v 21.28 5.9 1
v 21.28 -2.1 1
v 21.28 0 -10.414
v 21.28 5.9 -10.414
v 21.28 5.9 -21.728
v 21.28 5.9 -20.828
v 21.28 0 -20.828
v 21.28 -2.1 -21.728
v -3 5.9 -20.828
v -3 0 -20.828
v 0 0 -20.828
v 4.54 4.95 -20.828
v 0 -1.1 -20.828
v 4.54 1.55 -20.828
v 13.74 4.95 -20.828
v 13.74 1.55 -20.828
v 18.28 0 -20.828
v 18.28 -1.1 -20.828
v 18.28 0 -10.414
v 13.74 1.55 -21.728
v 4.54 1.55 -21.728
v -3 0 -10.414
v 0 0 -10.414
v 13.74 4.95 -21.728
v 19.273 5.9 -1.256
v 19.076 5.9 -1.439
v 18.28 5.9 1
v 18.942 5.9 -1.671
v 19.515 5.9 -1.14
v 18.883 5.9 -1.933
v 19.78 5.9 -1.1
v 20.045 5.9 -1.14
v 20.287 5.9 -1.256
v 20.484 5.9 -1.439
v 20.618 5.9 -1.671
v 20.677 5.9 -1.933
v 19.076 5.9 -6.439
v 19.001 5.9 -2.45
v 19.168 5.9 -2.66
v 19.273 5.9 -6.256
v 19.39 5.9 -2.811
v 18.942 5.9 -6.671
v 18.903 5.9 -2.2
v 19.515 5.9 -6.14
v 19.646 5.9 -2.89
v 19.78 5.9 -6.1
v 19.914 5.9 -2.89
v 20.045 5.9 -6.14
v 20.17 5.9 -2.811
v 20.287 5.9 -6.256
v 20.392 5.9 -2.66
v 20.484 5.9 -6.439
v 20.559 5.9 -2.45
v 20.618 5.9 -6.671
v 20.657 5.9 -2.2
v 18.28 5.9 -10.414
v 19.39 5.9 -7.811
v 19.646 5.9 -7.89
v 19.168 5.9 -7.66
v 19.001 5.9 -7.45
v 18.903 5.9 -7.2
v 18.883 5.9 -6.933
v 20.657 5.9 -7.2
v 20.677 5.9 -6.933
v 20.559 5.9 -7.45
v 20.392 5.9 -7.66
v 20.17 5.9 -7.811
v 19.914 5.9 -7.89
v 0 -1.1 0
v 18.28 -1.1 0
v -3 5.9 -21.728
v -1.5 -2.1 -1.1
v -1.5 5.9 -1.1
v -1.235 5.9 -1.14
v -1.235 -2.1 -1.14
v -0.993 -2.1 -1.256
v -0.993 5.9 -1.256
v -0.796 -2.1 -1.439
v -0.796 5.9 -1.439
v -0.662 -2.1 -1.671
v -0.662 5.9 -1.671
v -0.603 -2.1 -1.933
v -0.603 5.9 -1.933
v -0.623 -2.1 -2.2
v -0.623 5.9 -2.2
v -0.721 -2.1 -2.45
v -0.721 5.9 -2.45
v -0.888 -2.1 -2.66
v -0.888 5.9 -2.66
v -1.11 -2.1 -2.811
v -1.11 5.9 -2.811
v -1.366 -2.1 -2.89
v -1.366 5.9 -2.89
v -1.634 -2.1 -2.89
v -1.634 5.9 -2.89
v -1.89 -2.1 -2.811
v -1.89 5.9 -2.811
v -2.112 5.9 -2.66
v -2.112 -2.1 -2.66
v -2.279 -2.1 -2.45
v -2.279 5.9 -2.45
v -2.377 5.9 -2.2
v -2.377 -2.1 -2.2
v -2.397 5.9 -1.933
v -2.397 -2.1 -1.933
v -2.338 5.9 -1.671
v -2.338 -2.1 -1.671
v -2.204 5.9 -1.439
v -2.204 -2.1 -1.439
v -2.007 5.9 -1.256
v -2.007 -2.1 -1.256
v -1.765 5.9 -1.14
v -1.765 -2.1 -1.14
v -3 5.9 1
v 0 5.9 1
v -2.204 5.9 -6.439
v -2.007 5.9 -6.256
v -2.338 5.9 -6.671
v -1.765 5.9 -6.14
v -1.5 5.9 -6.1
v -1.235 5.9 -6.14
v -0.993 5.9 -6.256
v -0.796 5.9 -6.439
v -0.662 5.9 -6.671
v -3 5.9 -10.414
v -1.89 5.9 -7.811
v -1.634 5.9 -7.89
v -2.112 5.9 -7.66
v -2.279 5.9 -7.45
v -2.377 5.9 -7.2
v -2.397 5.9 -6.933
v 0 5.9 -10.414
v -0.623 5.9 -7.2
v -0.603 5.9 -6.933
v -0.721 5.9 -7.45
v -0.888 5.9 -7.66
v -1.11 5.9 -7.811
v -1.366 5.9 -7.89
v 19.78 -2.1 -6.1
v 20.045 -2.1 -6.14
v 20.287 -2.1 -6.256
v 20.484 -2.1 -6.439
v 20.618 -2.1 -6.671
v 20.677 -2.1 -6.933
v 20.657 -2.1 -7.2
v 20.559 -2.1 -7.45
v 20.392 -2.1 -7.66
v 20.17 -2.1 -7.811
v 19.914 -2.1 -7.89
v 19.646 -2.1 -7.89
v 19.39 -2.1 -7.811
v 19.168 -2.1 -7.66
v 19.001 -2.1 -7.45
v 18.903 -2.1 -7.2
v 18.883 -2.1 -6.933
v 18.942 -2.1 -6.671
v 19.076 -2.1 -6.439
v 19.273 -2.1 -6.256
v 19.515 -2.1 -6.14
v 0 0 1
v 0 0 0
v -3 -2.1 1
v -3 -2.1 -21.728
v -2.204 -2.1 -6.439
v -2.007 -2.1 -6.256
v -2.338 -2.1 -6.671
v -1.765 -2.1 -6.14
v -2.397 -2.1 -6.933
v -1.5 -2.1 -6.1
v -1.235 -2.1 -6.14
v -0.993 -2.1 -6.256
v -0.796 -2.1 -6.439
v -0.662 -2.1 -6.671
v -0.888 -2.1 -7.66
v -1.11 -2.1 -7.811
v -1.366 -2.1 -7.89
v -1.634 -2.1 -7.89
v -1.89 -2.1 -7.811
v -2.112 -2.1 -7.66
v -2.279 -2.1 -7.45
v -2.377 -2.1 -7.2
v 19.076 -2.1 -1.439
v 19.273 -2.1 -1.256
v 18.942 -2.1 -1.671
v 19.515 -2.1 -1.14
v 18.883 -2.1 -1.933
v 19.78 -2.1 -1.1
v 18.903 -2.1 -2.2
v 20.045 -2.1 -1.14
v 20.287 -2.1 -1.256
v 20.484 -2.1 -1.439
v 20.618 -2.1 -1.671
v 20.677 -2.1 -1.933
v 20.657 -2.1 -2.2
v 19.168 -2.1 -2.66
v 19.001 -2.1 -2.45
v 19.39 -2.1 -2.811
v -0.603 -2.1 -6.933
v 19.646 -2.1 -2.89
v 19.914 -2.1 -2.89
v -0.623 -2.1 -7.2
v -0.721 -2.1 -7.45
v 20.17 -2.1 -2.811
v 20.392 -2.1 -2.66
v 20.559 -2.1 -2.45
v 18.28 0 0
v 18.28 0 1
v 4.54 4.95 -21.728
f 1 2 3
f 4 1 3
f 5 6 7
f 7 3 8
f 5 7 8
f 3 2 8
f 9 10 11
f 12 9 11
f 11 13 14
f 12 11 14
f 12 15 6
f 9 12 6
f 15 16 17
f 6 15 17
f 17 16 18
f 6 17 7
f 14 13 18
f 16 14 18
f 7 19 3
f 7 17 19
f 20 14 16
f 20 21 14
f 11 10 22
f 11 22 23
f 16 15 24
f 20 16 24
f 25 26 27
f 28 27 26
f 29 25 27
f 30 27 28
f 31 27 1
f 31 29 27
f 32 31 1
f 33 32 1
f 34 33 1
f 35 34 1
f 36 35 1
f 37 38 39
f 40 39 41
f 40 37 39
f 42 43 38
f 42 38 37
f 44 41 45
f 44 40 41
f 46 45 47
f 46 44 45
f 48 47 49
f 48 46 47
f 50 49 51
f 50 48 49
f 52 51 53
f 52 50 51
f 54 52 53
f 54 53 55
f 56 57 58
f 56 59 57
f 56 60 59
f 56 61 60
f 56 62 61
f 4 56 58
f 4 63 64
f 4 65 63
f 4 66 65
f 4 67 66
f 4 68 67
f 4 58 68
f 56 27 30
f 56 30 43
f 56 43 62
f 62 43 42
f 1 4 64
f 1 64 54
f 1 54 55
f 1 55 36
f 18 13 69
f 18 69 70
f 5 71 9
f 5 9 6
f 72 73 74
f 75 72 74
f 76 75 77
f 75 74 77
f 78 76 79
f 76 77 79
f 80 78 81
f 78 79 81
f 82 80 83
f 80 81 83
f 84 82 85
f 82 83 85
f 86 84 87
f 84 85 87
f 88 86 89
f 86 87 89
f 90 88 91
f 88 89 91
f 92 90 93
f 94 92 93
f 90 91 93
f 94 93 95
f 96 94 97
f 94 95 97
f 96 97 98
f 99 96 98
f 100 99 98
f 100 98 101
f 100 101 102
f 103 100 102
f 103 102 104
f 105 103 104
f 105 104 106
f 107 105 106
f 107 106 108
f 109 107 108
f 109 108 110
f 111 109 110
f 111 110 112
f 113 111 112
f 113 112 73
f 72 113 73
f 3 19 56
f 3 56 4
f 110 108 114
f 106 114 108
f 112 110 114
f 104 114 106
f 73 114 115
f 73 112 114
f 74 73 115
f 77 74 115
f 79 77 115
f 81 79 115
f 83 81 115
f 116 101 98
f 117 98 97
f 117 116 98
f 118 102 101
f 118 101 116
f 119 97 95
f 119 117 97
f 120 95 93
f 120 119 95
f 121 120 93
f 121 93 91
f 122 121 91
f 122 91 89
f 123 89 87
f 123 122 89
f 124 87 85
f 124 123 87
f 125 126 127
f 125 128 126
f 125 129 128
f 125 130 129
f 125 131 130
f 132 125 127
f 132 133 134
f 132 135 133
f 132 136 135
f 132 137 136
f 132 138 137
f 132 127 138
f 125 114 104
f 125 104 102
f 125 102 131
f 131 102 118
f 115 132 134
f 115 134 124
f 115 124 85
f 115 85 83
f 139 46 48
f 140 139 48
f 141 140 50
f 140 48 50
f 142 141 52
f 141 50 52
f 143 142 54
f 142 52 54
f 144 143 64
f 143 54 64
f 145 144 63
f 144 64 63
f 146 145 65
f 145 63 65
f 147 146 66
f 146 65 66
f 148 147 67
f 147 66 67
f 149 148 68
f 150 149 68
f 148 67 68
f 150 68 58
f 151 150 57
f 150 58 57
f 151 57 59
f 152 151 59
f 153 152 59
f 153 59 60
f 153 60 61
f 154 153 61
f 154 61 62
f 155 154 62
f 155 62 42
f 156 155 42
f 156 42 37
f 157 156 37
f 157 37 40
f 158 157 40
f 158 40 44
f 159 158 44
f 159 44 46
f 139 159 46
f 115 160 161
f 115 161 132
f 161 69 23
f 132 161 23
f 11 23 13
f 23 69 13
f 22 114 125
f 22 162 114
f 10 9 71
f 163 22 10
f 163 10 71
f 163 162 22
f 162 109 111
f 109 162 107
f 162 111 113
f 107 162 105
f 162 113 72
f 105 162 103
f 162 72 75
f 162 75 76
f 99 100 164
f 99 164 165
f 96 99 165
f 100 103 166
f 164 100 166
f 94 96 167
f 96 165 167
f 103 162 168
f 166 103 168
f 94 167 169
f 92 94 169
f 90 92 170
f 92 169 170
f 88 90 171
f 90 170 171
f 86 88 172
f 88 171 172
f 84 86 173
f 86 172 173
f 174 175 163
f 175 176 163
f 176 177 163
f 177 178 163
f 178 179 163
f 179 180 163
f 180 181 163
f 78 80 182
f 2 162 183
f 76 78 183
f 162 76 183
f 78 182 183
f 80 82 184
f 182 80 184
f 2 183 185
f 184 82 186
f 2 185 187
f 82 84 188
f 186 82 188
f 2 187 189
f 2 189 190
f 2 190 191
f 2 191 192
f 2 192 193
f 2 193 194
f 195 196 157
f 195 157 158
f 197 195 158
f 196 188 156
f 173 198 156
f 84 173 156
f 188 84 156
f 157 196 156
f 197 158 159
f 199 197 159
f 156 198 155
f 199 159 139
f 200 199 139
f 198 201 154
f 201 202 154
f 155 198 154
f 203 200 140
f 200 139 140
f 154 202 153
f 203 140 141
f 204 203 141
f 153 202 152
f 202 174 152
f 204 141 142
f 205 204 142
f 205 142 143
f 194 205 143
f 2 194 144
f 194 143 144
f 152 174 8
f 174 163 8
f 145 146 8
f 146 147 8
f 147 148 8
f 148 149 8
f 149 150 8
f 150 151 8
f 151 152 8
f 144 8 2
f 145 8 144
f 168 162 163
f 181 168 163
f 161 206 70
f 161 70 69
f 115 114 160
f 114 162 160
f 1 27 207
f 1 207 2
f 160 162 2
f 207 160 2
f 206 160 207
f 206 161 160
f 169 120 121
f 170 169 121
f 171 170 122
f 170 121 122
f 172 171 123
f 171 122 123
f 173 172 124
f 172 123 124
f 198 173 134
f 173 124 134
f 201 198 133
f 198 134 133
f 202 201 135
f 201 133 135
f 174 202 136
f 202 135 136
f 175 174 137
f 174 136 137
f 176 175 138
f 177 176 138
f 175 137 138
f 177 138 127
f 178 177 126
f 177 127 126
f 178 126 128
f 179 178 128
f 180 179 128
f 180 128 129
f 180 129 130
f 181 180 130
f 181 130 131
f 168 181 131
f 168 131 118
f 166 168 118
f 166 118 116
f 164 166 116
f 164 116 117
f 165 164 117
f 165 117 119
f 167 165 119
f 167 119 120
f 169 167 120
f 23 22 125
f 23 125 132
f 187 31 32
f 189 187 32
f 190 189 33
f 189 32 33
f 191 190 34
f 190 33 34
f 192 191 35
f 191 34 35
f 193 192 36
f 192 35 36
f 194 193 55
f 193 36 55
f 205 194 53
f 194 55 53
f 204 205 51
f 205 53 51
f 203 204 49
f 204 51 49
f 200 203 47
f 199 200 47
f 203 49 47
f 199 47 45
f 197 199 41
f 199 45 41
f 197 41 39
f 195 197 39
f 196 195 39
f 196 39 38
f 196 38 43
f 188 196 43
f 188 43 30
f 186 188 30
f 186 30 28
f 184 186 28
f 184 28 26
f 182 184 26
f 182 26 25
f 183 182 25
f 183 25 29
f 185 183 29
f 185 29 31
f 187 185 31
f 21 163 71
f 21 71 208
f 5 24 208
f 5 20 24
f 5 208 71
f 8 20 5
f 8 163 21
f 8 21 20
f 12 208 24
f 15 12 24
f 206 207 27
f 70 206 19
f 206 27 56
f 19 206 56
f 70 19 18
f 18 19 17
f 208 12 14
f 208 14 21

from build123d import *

# Parameters (mm, degrees)
USB_LIP_DEPTH                       = 1.55
BASE_START                          = -1.1
SKETCH1_3_W                         = 18.28
SKETCH1_3_H                         = 20.828
BASE_W_1_1MM_COMPONENT_OFFSET_DEPTH = 1
SKETCH1_4_W                         = 3
SKETCH1_4_H                         = 20.828
SIDES_DEPTH                         = 2.1
SKETCH2_W                           = 7.54
SKETCH2_H                           = 0.9
USB_SIDES_DEPTH                     = 3.4
SKETCH3_W                           = 24.28
SKETCH3_H                           = 0.9
USB_TOP_DEPTH                       = 0.95
SKETCH4_W                           = 3
SKETCH4_H                           = 11.414
SIDE_GUARDS_DEPTH                   = 5.9
SKETCH5_R                           = 0.9
MOUNT_HOLES_DEPTH                   = 32.447486132


with BuildPart() as part:
    # Sketch1 → USB Lip (new body)
    with BuildSketch(Plane(origin=(0, 0, 0), x_dir=(1, 0, 0), z_dir=(0, 1, 0))):
        Polygon((18.28, 20.828), (21.28, 20.828), (21.28, 21.728), (-3, 21.728), (-3, 20.828), (0, 20.828), align=None)
    extrude(amount=USB_LIP_DEPTH)



with BuildPart() as body_2:
    # Sketch1<3> → Base w/ 1.1mm component offset (new body)
    with BuildSketch(Plane(origin=(0, 0, 0), x_dir=(1, 0, 0), z_dir=(0, 1, 0)).offset(BASE_START)):
        with Locations((9.14, 10.414)):
            Rectangle(SKETCH1_3_W, SKETCH1_3_H)
    extrude(amount=-BASE_W_1_1MM_COMPONENT_OFFSET_DEPTH)


with BuildPart() as part_1:
    add(part.part)

    add(body_2.part)  # Sides merges body 2
    # Sketch1<4> → Sides (add)
    with BuildSketch(Plane(origin=(0, 0, 0), x_dir=(1, 0, 0), z_dir=(0, 1, 0))):
        with Locations((-1.5, 10.414)):
            Rectangle(SKETCH1_4_W, SKETCH1_4_H)
        Polygon((21.28, 0), (21.28, -1), (-3, -1), (-3, 0), (0, 0), (18.28, 0), align=None)
        with Locations((19.78, 10.414)):
            Rectangle(SKETCH1_4_W, SKETCH1_4_H)
        Polygon((18.28, 20.828), (21.28, 20.828), (21.28, 21.728), (-3, 21.728), (-3, 20.828), (0, 20.828), align=None)
    extrude(amount=-SIDES_DEPTH)

    # Sketch2 → USB Sides (add)
    with BuildSketch(Plane(origin=(0, 1.55, 0), x_dir=(1, 0, 0), z_dir=(0, 1, 0))):
        with Locations((0.77, 21.278)):
            Rectangle(SKETCH2_W, SKETCH2_H)
        with Locations((17.51, 21.278)):
            Rectangle(SKETCH2_W, SKETCH2_H)
    extrude(amount=USB_SIDES_DEPTH)

    # Sketch3 → USB Top (add)
    with BuildSketch(Plane(origin=(0, 4.95, 0), x_dir=(1, 0, 0), z_dir=(0, 1, 0))):
        with Locations((9.14, 21.278)):
            Rectangle(SKETCH3_W, SKETCH3_H)
    extrude(amount=USB_TOP_DEPTH)

    # Sketch4 → Side Guards (add)
    with BuildSketch(Plane(origin=(0, 0, 0), x_dir=(1, 0, 0), z_dir=(0, 1, 0))):
        with Locations((-1.5, 4.707)):
            Rectangle(SKETCH4_W, SKETCH4_H)
        with Locations((19.78, 4.707)):
            Rectangle(SKETCH4_W, SKETCH4_H)
    extrude(amount=SIDE_GUARDS_DEPTH)

    # Sketch5 → Mount Holes (cut, through all)
    with BuildSketch(Plane(origin=(0, 5.9, 0), x_dir=(1, 0, 0), z_dir=(0, 1, 0))):
        with Locations(Location((-1.5, 2, 0), (0, 0, 270))):
            Circle(SKETCH5_R)
        with Locations(Location((19.78, 2, 0), (0, 0, 270))):
            Circle(SKETCH5_R)
        with Locations(Location((-1.5, 7, 0), (0, 0, 270))):
            Circle(SKETCH5_R)
        with Locations(Location((19.78, 7, 0), (0, 0, 270))):
            Circle(SKETCH5_R)
    extrude(amount=-MOUNT_HOLES_DEPTH, mode=Mode.SUBTRACT)


solid = part_1.part
